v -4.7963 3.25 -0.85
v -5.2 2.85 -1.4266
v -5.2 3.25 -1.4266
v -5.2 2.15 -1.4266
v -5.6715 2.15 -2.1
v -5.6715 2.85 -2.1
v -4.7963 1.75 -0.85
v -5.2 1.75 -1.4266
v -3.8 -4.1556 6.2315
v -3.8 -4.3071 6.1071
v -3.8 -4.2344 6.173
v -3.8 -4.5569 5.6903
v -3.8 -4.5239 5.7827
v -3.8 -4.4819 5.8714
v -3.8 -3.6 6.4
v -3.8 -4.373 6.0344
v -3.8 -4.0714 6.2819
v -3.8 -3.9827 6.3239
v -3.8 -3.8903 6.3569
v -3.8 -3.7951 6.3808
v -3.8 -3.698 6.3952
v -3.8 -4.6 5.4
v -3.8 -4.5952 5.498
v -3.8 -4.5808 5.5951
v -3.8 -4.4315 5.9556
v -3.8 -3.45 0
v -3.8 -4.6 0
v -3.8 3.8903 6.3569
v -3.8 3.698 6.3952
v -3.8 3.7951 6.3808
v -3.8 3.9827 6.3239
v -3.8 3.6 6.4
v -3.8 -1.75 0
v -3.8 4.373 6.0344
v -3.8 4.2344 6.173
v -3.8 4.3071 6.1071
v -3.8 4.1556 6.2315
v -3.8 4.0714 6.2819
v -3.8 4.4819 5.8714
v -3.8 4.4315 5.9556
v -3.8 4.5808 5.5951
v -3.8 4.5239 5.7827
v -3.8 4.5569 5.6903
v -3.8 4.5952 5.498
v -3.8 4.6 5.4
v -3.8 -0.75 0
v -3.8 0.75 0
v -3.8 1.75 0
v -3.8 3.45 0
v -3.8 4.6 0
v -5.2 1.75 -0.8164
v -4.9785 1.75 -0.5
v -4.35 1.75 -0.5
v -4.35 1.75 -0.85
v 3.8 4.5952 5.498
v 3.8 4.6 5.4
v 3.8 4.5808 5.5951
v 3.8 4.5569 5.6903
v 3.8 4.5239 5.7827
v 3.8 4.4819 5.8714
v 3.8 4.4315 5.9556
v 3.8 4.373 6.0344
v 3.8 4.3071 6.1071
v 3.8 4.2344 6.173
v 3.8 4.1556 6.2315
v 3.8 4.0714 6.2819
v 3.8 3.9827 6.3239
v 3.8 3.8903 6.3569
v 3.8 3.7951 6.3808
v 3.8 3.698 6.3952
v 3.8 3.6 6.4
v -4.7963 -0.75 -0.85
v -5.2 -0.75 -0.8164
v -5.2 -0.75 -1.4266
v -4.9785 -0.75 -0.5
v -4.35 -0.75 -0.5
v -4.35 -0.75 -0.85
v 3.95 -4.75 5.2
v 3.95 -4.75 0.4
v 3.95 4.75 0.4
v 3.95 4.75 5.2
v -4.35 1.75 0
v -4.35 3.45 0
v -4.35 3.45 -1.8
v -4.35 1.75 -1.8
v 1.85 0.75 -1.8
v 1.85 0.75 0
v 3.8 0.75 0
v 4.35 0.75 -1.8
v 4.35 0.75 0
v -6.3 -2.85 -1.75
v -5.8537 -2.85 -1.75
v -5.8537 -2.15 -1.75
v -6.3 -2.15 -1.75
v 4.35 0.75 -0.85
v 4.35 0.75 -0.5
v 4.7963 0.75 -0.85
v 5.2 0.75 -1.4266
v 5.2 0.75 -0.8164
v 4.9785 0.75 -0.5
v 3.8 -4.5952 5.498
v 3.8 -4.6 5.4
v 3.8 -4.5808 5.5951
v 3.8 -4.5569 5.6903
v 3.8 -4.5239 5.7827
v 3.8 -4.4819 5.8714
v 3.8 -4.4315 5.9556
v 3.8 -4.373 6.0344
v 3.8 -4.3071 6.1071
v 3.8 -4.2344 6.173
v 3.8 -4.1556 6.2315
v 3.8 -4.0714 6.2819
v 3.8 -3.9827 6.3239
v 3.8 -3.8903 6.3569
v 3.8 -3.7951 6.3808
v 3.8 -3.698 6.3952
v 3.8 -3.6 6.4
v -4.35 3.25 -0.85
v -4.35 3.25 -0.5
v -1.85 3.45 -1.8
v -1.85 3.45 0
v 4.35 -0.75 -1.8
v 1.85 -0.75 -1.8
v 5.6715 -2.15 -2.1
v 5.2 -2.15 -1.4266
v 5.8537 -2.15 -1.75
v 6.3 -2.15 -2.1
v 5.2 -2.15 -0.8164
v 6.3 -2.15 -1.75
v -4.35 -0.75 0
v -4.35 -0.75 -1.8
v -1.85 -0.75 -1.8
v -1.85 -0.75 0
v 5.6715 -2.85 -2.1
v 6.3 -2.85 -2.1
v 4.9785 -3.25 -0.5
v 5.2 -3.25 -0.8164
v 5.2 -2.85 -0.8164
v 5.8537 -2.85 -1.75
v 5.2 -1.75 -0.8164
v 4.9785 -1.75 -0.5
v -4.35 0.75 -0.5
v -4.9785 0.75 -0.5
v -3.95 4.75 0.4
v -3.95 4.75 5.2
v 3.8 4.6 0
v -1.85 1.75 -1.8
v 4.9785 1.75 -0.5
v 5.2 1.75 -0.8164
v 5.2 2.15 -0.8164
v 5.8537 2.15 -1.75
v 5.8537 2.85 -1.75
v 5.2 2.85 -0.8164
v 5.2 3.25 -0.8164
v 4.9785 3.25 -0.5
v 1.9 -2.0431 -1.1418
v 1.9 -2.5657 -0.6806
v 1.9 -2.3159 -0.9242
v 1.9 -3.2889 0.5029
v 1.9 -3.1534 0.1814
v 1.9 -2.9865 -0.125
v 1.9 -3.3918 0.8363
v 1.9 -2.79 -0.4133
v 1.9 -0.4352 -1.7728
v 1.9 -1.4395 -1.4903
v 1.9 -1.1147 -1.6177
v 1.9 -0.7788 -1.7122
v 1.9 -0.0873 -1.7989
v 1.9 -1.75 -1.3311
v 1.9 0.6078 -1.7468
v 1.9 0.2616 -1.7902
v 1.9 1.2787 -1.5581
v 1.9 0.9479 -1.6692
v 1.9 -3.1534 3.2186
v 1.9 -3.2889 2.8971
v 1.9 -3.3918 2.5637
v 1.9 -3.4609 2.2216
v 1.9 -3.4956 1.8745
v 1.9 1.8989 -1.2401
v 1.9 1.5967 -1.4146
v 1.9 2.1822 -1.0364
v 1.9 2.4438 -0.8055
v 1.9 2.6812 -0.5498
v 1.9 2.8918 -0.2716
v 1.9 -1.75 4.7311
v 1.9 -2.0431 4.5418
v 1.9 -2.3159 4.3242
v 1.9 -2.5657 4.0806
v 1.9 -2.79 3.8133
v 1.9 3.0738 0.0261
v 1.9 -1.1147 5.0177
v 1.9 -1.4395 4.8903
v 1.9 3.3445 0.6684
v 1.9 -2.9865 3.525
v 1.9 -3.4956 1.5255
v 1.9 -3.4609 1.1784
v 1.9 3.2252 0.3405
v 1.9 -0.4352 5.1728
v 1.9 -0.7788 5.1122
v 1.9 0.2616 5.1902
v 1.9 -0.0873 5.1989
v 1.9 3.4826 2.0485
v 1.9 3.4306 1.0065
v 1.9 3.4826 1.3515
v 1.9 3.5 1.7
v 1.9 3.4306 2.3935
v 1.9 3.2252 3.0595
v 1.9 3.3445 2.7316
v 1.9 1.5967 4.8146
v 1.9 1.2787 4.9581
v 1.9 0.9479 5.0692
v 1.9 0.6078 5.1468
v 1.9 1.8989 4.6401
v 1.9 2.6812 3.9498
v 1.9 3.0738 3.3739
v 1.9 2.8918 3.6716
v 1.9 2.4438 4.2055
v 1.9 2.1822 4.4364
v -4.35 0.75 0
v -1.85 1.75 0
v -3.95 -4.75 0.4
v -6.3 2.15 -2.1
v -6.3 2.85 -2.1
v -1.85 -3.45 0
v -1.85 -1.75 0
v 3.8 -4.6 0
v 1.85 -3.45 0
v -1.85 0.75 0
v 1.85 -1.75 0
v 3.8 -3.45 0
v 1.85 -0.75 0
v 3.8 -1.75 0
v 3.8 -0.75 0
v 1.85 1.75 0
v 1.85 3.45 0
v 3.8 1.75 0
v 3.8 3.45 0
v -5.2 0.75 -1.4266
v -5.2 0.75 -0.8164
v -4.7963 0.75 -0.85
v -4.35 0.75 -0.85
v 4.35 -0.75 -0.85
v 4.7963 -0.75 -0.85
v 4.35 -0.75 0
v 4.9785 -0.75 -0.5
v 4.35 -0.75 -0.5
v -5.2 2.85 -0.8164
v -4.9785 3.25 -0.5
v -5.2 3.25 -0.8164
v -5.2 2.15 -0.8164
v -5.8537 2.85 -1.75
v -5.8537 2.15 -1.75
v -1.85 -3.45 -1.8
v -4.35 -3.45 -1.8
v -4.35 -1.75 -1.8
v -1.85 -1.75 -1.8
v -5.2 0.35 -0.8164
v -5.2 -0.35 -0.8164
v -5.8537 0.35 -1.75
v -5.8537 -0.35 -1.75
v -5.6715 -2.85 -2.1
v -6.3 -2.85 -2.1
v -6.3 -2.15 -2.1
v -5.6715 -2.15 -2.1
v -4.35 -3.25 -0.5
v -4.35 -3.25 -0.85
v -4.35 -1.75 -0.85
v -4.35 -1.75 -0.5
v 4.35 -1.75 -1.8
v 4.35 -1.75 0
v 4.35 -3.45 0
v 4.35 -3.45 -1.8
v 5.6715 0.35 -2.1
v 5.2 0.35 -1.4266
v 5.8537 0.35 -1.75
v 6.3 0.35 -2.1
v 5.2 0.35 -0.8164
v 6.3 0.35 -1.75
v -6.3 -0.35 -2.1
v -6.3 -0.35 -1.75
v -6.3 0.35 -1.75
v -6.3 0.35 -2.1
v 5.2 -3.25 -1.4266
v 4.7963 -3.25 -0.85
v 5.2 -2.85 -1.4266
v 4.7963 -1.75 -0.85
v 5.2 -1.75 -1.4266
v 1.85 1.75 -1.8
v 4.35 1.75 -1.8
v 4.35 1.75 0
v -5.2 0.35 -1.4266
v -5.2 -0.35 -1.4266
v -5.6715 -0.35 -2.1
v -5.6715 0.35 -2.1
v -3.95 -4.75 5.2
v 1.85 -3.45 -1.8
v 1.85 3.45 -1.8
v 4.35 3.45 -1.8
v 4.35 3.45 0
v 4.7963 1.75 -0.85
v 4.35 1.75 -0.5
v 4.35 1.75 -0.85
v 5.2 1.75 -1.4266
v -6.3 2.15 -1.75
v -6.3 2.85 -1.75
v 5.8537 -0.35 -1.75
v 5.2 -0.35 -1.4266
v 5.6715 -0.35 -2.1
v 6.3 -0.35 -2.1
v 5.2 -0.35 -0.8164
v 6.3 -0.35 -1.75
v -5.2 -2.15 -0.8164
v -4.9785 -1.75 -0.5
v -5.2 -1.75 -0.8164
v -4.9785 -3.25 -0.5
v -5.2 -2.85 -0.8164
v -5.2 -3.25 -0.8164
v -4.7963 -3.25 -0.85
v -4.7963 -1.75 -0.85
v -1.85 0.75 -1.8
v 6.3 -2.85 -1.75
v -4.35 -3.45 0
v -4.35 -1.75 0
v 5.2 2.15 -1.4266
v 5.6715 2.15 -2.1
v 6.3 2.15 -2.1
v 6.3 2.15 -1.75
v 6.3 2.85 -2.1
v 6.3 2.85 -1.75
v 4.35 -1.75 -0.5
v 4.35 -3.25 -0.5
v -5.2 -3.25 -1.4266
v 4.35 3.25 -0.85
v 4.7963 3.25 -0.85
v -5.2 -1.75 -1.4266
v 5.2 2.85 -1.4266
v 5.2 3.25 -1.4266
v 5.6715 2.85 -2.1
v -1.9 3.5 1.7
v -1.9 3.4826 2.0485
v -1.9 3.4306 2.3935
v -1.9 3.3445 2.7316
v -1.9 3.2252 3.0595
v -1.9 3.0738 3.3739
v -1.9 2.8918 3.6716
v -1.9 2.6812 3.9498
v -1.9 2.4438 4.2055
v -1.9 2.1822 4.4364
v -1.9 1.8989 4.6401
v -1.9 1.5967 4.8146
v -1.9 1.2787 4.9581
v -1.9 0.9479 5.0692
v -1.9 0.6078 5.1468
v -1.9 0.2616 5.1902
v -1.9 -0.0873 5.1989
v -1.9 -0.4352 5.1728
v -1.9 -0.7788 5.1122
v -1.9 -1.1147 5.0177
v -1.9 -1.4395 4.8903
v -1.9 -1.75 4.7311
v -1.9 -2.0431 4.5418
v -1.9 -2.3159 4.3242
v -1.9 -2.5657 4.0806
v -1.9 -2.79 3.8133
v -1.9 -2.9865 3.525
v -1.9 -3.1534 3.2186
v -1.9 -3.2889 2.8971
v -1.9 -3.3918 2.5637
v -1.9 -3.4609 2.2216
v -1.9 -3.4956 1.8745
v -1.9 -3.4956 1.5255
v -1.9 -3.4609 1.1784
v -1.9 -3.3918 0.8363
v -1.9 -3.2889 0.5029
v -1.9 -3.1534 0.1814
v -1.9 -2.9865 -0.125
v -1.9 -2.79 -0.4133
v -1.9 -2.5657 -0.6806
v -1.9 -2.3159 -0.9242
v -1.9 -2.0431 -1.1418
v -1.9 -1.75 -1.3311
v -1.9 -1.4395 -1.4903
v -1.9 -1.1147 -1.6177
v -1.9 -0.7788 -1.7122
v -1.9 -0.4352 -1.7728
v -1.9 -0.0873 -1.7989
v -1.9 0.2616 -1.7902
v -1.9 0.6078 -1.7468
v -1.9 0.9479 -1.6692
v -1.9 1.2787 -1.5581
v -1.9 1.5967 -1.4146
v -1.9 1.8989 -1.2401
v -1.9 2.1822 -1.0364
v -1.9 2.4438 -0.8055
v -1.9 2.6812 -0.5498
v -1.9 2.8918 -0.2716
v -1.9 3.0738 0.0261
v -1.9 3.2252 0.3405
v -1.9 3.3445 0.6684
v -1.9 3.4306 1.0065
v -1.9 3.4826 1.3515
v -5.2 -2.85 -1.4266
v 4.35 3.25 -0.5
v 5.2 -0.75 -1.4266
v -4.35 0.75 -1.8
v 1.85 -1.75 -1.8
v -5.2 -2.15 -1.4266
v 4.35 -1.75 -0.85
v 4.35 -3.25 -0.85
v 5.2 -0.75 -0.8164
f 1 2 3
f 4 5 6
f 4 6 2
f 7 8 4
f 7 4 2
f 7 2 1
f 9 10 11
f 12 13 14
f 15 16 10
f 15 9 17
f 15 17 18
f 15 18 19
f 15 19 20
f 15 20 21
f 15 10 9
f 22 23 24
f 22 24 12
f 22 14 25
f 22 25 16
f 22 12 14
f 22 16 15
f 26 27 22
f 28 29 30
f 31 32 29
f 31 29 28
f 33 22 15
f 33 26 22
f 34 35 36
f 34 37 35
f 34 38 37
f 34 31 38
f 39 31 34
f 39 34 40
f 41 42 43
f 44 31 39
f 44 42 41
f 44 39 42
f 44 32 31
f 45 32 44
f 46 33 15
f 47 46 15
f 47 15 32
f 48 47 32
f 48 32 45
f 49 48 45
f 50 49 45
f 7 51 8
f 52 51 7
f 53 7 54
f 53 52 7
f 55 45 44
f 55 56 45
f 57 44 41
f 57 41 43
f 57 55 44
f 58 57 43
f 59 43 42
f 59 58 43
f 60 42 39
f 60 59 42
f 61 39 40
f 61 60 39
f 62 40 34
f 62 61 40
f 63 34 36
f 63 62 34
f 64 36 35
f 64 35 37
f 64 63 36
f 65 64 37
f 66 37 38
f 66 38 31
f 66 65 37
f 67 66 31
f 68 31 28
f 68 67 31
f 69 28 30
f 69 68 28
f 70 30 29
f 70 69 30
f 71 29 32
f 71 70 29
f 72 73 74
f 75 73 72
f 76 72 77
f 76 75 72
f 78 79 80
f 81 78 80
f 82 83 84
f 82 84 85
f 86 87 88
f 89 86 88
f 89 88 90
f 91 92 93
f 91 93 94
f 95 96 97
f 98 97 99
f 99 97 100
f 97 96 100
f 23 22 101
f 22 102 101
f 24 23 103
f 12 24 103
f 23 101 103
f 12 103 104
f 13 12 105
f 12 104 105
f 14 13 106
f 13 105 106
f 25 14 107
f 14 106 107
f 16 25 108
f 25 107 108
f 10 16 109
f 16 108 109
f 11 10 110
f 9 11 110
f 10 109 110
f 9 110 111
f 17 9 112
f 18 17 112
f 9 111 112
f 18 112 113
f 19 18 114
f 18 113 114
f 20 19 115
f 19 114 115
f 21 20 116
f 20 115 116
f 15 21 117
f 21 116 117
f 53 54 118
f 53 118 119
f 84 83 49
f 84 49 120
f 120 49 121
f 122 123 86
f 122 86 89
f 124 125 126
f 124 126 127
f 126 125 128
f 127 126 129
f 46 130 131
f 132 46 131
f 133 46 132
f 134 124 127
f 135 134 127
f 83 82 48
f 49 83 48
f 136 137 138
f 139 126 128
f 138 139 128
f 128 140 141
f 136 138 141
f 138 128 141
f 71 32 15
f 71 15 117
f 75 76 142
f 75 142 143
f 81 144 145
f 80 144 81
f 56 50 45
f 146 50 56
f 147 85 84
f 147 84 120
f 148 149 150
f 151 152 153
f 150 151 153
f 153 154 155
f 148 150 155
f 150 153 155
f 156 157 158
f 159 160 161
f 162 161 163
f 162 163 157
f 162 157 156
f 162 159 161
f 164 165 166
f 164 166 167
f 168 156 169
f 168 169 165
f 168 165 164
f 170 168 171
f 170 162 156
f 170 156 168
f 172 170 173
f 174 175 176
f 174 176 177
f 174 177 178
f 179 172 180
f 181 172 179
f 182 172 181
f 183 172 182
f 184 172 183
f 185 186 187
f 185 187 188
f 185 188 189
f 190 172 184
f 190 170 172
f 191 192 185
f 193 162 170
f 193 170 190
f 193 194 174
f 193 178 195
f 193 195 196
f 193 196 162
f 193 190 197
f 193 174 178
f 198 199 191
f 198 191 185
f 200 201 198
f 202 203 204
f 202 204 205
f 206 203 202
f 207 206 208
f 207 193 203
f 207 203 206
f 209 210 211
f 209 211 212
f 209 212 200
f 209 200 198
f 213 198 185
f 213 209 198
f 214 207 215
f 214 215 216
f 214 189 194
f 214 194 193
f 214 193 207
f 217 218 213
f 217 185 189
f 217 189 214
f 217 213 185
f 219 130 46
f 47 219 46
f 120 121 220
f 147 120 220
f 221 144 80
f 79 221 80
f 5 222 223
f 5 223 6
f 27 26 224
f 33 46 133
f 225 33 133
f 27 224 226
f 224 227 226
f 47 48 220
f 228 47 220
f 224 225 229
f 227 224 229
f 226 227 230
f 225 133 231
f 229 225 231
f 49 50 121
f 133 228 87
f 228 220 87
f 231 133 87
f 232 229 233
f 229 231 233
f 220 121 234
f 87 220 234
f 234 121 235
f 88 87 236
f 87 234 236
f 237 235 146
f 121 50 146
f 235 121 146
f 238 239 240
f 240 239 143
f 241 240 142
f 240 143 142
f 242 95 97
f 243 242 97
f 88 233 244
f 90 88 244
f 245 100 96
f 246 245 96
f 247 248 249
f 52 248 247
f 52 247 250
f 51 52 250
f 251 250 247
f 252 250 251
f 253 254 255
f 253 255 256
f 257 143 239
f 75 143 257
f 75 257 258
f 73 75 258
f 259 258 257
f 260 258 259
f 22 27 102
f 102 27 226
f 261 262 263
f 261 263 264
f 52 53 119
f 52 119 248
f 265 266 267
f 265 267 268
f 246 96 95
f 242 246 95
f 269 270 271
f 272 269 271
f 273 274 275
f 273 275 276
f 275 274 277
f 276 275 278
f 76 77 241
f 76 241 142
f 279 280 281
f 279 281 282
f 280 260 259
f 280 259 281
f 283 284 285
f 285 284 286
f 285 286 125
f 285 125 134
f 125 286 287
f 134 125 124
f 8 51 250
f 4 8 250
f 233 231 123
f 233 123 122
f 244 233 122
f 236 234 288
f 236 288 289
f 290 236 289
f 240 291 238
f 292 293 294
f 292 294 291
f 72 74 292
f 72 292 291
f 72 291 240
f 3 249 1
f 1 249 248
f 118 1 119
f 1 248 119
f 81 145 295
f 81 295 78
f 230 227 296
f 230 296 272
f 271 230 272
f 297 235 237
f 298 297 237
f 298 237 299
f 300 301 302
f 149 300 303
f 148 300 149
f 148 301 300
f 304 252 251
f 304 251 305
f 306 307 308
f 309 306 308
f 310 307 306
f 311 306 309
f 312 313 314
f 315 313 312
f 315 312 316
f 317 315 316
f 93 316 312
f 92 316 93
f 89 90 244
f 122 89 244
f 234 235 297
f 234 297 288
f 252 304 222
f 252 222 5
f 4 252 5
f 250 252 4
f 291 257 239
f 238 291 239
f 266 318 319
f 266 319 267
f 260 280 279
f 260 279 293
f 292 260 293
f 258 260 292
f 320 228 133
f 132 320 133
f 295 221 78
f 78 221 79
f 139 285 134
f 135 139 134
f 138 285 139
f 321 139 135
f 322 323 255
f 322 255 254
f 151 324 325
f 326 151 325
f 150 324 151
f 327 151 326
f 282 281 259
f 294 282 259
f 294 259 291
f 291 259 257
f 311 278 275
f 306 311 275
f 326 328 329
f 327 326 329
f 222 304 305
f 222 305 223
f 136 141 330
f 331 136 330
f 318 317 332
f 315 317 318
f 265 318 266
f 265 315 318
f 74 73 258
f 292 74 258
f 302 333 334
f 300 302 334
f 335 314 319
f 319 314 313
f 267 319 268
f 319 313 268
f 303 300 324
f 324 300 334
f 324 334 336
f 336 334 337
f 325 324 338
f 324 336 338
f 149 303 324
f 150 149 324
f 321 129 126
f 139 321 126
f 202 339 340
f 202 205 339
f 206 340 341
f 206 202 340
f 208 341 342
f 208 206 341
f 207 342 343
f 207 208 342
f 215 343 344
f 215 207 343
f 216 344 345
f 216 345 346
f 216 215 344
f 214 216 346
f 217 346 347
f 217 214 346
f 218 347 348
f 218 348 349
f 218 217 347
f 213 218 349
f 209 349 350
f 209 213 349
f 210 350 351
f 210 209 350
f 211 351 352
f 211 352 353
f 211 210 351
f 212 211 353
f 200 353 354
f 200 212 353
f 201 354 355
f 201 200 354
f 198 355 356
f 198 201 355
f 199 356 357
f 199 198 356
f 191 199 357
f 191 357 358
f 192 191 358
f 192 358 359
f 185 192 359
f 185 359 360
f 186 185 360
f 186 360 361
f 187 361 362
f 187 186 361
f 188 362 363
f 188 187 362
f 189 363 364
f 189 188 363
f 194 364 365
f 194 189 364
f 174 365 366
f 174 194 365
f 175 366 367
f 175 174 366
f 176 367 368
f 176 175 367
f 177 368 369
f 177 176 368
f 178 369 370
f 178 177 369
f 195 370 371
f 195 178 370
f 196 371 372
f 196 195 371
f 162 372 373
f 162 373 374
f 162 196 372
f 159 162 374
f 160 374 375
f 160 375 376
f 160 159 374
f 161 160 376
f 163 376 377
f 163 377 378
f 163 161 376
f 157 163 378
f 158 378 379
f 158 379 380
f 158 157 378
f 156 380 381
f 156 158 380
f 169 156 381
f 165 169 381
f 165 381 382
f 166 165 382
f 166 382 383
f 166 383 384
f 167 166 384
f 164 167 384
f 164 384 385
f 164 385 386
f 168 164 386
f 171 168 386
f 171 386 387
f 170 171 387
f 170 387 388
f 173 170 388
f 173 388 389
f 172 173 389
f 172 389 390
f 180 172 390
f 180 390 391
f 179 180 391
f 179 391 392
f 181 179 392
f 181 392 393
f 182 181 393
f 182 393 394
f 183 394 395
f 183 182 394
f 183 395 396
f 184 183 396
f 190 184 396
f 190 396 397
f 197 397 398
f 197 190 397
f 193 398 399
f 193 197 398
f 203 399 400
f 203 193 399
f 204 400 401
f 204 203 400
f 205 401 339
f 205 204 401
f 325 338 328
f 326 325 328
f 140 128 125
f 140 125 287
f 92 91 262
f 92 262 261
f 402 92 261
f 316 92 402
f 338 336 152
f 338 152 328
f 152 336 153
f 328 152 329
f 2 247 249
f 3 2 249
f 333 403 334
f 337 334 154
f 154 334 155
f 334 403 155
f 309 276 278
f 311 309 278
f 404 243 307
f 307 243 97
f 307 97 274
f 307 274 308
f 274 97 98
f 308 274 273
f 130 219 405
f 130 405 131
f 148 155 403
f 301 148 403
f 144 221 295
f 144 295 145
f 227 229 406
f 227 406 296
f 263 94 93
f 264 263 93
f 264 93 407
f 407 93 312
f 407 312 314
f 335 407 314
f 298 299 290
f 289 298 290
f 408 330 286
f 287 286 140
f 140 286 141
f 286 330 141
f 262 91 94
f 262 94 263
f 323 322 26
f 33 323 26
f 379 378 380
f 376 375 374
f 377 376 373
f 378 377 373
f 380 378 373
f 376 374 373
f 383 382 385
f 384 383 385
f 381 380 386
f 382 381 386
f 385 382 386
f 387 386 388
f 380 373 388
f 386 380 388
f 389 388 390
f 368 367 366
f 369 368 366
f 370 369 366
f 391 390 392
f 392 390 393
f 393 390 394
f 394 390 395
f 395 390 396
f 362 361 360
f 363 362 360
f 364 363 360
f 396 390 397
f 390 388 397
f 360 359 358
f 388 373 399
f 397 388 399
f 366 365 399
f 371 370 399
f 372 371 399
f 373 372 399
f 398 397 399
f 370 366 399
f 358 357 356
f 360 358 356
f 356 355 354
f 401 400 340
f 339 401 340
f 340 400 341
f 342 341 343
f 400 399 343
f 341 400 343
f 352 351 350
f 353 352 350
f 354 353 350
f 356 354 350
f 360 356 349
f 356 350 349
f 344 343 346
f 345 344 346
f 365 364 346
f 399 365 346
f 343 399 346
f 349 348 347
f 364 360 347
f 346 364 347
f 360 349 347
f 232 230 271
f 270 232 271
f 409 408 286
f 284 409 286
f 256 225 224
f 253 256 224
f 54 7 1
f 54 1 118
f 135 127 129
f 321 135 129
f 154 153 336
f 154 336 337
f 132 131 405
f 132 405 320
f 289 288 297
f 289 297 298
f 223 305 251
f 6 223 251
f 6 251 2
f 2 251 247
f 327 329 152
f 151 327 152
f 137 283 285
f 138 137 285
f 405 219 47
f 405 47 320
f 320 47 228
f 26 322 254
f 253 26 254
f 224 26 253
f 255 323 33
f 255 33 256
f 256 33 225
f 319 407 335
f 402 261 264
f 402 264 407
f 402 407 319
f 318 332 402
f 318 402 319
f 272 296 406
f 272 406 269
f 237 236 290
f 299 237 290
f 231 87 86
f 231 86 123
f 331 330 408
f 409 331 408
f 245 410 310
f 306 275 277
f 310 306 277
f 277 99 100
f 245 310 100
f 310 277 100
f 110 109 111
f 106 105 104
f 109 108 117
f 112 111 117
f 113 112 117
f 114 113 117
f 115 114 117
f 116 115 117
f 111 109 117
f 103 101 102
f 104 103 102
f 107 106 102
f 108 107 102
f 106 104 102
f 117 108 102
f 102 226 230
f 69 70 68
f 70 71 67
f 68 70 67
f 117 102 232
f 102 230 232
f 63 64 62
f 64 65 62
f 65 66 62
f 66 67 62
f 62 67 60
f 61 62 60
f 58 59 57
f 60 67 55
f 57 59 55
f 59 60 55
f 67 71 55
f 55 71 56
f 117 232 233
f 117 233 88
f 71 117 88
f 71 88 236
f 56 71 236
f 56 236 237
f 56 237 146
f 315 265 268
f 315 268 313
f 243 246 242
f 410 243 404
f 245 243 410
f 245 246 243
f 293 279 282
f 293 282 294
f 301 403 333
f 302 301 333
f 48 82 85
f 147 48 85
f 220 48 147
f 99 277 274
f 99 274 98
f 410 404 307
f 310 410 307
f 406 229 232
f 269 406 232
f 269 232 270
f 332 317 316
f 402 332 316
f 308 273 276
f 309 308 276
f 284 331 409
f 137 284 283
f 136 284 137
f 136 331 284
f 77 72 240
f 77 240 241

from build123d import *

# Parameters (mm, degrees)
F0_W      = 7.6
F0_H      = 9.2
F1_DEPTH  = 6.4
F2_R      = 1
F4_W      = 7.9
F4_H      = 9.5
F5_DEPTH  = 4.8
F6_W      = 2.5
F6_H      = 1.7
F6_H_2    = 1.5
F7_DEPTH  = 1.8
F8_R      = 3.5
F9_DEPTH  = 1.9
F11_DEPTH = 3.5
F12_W     = 1.95
F12_H     = 0.25
F12_H_2   = 1
F13_DEPTH = 2.101
F14_W     = 1.1
F14_H     = 1.8
F14_H_2   = 1.9
F15_DEPTH = 25


with BuildPart() as f1:
    # F0 (on Top) → F1 (new body)
    with BuildSketch(Plane.XY):
        Rectangle(F0_W, F0_H)
    extrude(amount=F1_DEPTH)

    # F2
    f2_edges = [f1.edges().sort_by_distance(p)[0] for p in [
        (0, 4.6, 6.4),
        (0, -4.6, 6.4),
    ]]
    fillet(f2_edges, radius=F2_R)

    # F6 (on face) → F7 (join)
    with BuildSketch(Plane(origin=(0, 0, 0), x_dir=(1, 0, 0), z_dir=(0, 0, -1))):
        with Locations((3.1, -2.6)):
            Rectangle(F6_W, F6_H)
        with Locations((3.1, 0)):
            Rectangle(F6_W, F6_H_2)
        with Locations((3.1, 2.6)):
            Rectangle(F6_W, F6_H)
        with Locations((-3.1, 2.6)):
            Rectangle(F6_W, F6_H)
        with Locations((-3.1, 0)):
            Rectangle(F6_W, F6_H_2)
        with Locations((-3.1, -2.6)):
            Rectangle(F6_W, F6_H)
    extrude(amount=F7_DEPTH)


with BuildPart() as f5:
    # F4 (on offset) → F5 (new body)
    with BuildSketch(Plane.XY.offset(0.4)):
        Rectangle(F4_W, F4_H)
    extrude(amount=F5_DEPTH)


with BuildPart() as f9:
    # F8 (on Right) → F9 (new body, symmetric)
    with BuildSketch(Plane.YZ):
        with Locations((0, 1.7)):
            Circle(F8_R)
    extrude(amount=F9_DEPTH, both=True)


with BuildPart() as f11:
    # F10 (on Front) → F11 (new body, symmetric)
    with BuildSketch(Plane.XZ):
        Polygon((4.97847, -0.5), (4.35, -0.5), (4.35, -0.85), (4.796271, -0.85), (5.67153, -2.1), (6.3, -2.1), (6.3, -1.75), (5.853729, -1.75), align=None)
        Polygon((-4.796271, -0.85), (-4.35, -0.85), (-4.35, -0.5), (-4.97847, -0.5), (-5.853729, -1.75), (-6.3, -1.75), (-6.3, -2.1), (-5.67153, -2.1), align=None)
    extrude(amount=F11_DEPTH, both=True)

    # F12 (on Top) → F13 (cut, through all)
    with BuildSketch(Plane.XY):
        with Locations((-5.325, -3.375)):
            Rectangle(F12_W, F12_H)
        with Locations((-5.325, -1.25)):
            Rectangle(F12_W, F12_H_2)
        with Locations((-5.325, 3.375)):
            Rectangle(F12_W, F12_H)
        with Locations((-5.325, 1.25)):
            Rectangle(F12_W, F12_H_2)
        with Locations((5.325, -3.375)):
            Rectangle(F12_W, F12_H)
        with Locations((5.325, 3.375)):
            Rectangle(F12_W, F12_H)
        with Locations((5.325, 1.25)):
            Rectangle(F12_W, F12_H_2)
        with Locations((5.325, -1.25)):
            Rectangle(F12_W, F12_H_2)
    extrude(amount=-F13_DEPTH, mode=Mode.SUBTRACT)

    # F14 (on Top) → F15 (cut)
    with BuildSketch(Plane.XY):
        with Locations((-5.75, -1.25)):
            Rectangle(F14_W, F14_H)
        with Locations((-5.75, 1.25)):
            Rectangle(F14_W, F14_H)
        with Locations((-5.75, -3.8)):
            Rectangle(F14_W, F14_H_2)
        with Locations((-5.75, 3.8)):
            Rectangle(F14_W, F14_H_2)
        with Locations((5.75, -1.25)):
            Rectangle(F14_W, F14_H)
        with Locations((5.75, 1.25)):
            Rectangle(F14_W, F14_H)
        with Locations((5.75, 3.8)):
            Rectangle(F14_W, F14_H_2)
        with Locations((5.75, -3.8)):
            Rectangle(F14_W, F14_H_2)
    extrude(amount=-F15_DEPTH, mode=Mode.SUBTRACT)


solid = Compound([f1.part, f5.part, f9.part, f11.part])
